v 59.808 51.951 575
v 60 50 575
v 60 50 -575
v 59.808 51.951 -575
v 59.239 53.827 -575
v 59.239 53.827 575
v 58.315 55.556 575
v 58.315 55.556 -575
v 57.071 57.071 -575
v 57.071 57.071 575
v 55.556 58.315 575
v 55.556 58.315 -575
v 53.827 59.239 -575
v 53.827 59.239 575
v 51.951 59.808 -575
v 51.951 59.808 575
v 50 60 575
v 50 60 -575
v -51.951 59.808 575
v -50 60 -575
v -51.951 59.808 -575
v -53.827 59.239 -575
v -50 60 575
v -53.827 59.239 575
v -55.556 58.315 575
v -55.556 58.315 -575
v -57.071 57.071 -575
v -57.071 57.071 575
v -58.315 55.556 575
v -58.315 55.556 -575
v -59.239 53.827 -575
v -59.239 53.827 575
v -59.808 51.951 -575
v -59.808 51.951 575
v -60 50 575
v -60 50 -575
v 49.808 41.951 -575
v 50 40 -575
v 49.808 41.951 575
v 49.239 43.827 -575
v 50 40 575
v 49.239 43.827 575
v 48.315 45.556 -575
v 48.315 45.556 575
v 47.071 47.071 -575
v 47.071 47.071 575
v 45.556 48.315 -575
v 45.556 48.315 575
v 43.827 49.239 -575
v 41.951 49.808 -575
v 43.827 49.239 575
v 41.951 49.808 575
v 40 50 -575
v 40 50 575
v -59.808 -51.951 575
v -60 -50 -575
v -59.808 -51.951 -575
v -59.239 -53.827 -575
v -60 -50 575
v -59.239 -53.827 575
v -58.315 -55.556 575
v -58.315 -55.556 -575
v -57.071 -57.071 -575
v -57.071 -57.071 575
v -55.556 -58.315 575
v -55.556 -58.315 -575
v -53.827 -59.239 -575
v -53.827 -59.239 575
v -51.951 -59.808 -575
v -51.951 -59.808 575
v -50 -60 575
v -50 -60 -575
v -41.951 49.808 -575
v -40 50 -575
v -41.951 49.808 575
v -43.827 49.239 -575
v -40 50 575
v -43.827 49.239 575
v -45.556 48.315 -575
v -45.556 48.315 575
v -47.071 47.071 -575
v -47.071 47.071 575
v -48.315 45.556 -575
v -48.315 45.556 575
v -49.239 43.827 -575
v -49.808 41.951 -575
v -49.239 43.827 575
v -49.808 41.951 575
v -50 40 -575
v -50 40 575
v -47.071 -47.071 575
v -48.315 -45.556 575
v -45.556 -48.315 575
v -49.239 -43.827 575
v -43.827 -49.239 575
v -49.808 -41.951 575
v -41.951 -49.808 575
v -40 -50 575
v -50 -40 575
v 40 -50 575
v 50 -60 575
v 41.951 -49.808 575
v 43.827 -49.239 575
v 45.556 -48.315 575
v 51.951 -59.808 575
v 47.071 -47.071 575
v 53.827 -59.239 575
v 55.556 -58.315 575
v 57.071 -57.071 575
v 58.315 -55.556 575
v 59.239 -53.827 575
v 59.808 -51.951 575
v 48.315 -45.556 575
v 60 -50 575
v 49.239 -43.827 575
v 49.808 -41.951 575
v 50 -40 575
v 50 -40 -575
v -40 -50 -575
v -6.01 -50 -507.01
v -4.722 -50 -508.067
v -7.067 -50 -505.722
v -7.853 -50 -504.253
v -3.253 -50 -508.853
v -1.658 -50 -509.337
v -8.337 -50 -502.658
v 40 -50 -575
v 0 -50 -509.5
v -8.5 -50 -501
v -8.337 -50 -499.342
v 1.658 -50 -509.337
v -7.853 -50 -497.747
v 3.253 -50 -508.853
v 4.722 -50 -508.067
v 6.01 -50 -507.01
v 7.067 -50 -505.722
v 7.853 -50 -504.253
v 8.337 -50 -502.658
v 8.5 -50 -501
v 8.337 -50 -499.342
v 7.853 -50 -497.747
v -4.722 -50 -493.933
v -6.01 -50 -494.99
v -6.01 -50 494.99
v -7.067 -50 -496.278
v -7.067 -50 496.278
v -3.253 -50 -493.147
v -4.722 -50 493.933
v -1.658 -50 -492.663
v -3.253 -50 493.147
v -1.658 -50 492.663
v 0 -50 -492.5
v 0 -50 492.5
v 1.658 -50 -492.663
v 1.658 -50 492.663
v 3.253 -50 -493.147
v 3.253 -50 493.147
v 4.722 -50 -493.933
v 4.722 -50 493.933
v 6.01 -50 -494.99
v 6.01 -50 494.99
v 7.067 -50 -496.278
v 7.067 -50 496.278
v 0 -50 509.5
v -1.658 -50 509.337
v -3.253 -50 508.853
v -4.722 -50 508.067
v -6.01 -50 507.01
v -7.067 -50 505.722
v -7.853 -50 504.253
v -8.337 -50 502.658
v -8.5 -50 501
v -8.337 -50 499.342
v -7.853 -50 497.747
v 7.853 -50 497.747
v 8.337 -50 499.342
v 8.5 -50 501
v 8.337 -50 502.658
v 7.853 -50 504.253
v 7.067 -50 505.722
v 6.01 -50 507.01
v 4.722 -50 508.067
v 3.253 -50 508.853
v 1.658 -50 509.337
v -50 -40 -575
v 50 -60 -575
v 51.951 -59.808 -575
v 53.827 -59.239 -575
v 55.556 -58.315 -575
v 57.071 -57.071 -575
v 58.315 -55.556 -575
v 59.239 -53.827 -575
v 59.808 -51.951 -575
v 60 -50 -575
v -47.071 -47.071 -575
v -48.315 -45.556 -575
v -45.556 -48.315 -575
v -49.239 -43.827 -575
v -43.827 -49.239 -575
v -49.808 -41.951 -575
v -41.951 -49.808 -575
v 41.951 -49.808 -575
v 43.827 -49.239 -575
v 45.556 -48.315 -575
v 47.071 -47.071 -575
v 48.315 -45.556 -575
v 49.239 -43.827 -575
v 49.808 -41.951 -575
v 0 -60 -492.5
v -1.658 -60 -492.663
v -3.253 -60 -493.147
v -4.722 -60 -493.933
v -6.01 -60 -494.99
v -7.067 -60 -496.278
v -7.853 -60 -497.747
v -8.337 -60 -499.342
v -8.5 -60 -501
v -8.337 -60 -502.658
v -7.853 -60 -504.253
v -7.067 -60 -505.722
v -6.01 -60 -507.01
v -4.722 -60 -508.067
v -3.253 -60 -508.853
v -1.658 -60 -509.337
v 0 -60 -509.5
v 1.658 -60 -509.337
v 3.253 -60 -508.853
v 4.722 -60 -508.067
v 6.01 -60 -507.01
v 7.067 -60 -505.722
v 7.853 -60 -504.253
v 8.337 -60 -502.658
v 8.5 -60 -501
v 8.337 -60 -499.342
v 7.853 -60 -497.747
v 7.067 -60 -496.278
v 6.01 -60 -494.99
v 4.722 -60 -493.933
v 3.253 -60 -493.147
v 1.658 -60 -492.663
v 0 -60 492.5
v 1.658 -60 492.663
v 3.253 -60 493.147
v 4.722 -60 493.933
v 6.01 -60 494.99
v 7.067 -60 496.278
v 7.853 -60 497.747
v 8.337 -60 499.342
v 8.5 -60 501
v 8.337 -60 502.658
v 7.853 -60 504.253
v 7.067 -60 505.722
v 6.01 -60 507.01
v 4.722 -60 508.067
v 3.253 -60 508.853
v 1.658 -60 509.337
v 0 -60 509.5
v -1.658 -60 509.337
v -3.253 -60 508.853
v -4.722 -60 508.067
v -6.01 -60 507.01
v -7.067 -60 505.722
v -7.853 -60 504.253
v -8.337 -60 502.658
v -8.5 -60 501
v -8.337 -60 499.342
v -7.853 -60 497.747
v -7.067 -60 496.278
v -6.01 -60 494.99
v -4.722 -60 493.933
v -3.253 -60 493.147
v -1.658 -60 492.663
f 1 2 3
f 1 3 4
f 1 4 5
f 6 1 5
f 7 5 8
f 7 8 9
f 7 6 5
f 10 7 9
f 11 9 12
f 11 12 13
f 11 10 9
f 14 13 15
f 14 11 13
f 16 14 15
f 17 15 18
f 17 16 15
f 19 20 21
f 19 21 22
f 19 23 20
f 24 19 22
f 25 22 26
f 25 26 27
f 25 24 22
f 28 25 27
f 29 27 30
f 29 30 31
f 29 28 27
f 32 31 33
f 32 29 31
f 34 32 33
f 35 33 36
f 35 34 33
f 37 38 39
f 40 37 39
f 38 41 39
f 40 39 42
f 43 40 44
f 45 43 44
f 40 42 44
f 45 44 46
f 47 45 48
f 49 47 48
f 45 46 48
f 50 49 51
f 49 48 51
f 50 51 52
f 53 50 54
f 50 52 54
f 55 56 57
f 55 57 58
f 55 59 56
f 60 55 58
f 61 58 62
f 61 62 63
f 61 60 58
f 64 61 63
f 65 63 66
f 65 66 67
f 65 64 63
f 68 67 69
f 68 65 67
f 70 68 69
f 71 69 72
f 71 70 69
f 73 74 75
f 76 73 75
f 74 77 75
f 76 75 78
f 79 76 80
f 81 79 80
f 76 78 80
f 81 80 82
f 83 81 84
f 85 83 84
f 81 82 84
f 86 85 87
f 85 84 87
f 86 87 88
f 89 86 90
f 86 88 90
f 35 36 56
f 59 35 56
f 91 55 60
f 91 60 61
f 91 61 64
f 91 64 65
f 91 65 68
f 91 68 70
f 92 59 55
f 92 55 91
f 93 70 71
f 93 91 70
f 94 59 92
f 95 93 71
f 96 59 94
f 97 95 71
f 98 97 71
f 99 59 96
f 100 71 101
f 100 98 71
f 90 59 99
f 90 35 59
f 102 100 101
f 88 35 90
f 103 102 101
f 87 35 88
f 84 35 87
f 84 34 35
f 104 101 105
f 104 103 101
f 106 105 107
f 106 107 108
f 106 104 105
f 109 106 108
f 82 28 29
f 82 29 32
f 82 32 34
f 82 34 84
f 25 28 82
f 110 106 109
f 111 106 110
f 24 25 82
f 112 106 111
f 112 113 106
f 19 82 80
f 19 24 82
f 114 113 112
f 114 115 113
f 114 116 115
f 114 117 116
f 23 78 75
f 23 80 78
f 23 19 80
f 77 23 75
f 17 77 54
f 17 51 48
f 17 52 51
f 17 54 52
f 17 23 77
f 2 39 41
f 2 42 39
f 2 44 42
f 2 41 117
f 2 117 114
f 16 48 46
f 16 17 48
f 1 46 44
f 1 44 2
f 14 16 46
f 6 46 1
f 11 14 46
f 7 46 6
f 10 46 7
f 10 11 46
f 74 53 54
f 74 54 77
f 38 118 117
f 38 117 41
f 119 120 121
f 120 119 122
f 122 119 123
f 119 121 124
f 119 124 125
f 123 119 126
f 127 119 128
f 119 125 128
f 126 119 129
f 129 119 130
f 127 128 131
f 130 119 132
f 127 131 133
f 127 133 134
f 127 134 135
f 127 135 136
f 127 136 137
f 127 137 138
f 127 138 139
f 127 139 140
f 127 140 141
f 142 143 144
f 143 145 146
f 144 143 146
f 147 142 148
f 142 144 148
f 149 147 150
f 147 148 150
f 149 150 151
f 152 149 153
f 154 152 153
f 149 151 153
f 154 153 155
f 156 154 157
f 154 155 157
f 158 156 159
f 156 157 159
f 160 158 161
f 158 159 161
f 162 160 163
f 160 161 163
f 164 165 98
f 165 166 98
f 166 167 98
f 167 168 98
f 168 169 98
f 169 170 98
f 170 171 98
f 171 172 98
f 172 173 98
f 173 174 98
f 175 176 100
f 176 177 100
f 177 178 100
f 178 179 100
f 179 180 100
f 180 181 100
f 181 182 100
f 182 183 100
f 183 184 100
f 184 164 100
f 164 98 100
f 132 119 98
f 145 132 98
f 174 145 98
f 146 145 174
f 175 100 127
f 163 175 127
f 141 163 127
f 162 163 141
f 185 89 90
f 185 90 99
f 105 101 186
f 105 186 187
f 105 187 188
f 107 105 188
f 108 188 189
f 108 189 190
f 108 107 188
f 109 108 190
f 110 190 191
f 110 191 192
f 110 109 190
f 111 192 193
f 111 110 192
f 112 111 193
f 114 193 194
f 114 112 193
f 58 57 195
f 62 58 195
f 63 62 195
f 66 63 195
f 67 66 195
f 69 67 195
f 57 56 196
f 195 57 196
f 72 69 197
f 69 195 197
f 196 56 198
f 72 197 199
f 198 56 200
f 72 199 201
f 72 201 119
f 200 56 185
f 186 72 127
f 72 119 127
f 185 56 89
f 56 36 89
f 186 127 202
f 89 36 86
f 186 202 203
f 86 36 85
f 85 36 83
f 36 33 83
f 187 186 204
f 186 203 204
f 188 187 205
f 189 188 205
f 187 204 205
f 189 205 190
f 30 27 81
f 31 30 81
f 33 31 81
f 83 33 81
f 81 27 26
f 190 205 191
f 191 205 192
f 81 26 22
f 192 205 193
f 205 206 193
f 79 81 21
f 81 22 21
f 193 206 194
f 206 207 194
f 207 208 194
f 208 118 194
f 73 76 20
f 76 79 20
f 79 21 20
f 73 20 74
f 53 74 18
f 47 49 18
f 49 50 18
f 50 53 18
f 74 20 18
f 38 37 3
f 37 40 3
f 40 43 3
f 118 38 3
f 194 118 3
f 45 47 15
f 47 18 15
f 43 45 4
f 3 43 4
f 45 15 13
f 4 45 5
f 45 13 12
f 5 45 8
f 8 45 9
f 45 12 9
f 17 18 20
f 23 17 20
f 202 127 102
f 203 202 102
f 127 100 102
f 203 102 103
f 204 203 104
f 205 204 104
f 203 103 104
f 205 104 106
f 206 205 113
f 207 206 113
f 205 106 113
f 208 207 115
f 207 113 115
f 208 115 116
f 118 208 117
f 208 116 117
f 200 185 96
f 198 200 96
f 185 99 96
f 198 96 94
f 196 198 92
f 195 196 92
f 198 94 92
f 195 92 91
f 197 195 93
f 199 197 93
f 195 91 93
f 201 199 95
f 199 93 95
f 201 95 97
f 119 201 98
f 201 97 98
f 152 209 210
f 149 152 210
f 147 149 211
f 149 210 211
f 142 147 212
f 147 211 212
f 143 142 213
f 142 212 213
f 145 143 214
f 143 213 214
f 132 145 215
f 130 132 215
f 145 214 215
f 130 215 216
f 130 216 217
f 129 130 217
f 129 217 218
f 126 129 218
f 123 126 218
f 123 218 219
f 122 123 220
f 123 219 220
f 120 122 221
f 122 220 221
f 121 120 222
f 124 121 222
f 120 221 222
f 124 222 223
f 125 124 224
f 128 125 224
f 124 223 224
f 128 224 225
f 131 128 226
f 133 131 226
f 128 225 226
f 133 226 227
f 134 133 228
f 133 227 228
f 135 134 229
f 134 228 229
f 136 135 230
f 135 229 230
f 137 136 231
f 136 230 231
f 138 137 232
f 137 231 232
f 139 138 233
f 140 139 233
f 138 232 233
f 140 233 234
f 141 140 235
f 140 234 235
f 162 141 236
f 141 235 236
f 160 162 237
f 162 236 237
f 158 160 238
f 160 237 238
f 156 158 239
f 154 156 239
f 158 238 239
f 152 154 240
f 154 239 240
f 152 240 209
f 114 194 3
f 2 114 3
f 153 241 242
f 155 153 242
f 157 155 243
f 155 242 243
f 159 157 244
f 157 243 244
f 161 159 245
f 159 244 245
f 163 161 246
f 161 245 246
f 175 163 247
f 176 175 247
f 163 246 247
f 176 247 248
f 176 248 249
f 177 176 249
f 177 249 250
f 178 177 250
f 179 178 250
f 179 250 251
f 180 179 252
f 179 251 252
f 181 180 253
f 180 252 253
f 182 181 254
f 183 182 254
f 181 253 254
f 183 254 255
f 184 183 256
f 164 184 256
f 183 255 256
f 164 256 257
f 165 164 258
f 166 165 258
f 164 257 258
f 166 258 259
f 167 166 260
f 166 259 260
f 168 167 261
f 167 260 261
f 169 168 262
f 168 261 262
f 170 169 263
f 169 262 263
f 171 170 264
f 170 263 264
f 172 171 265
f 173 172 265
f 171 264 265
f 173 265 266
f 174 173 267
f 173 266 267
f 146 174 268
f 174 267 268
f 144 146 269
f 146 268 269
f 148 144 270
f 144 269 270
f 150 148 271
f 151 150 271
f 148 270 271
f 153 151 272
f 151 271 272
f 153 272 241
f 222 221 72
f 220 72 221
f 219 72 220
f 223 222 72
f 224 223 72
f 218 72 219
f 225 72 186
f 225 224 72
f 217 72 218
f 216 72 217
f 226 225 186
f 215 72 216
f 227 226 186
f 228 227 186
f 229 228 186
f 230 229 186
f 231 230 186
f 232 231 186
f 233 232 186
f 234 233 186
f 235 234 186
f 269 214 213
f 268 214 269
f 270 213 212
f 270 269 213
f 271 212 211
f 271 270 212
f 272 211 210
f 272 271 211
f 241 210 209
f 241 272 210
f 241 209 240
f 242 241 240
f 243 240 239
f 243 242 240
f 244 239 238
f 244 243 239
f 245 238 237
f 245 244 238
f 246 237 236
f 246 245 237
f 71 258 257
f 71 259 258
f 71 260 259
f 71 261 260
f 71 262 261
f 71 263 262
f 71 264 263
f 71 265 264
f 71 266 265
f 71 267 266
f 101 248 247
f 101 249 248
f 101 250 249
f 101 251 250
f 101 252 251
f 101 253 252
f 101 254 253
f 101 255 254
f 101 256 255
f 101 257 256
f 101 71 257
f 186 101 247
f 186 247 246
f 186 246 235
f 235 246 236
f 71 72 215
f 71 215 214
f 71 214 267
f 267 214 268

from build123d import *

# Parameters (mm, degrees)
BOSS_EXTRUDE1_DEPTH = 575
SKETCH2_R           = 8.5
CUT_EXTRUDE1_DEPTH  = 10


with BuildPart() as part:
    # Sketch1 → Boss-Extrude1 (new, symmetric)
    with BuildSketch(Plane.XY):
        with BuildLine():
            Line((-50, -60), (50, -60))
            ThreePointArc((50, -60), (57.071067812, -57.071067812), (60, -50))
            Line((60, -50), (60, 50))
            ThreePointArc((60, 50), (57.071067812, 57.071067812), (50, 60))
            Line((50, 60), (-50, 60))
            ThreePointArc((-50, 60), (-57.071067812, 57.071067812), (-60, 50))
            Line((-60, 50), (-60, -50))
            ThreePointArc((-60, -50), (-57.071067812, -57.071067812), (-50, -60))
        make_face()
        with BuildLine():
            Line((-40, -50), (40, -50))
            ThreePointArc((40, -50), (47.071067812, -47.071067812), (50, -40))
            Line((50, -40), (50, 40))
            ThreePointArc((50, 40), (47.071067812, 47.071067812), (40, 50))
            Line((40, 50), (-40, 50))
            ThreePointArc((-40, 50), (-47.071067812, 47.071067812), (-50, 40))
            Line((-50, 40), (-50, -40))
            ThreePointArc((-50, -40), (-47.071067812, -47.071067812), (-40, -50))
        make_face(mode=Mode.SUBTRACT)
    extrude(amount=BOSS_EXTRUDE1_DEPTH, both=True)

    # Sketch2 → Cut-Extrude1 (cut)
    with BuildSketch(Plane.XZ.offset(60)):
        with Locations(Location((0, 501, 0), (0, 0, 270))):
            Circle(SKETCH2_R)
        with Locations(Location((0, -501, 0), (0, 0, 90))):
            Circle(SKETCH2_R)
    extrude(amount=-CUT_EXTRUDE1_DEPTH, mode=Mode.SUBTRACT)


solid = part.part
